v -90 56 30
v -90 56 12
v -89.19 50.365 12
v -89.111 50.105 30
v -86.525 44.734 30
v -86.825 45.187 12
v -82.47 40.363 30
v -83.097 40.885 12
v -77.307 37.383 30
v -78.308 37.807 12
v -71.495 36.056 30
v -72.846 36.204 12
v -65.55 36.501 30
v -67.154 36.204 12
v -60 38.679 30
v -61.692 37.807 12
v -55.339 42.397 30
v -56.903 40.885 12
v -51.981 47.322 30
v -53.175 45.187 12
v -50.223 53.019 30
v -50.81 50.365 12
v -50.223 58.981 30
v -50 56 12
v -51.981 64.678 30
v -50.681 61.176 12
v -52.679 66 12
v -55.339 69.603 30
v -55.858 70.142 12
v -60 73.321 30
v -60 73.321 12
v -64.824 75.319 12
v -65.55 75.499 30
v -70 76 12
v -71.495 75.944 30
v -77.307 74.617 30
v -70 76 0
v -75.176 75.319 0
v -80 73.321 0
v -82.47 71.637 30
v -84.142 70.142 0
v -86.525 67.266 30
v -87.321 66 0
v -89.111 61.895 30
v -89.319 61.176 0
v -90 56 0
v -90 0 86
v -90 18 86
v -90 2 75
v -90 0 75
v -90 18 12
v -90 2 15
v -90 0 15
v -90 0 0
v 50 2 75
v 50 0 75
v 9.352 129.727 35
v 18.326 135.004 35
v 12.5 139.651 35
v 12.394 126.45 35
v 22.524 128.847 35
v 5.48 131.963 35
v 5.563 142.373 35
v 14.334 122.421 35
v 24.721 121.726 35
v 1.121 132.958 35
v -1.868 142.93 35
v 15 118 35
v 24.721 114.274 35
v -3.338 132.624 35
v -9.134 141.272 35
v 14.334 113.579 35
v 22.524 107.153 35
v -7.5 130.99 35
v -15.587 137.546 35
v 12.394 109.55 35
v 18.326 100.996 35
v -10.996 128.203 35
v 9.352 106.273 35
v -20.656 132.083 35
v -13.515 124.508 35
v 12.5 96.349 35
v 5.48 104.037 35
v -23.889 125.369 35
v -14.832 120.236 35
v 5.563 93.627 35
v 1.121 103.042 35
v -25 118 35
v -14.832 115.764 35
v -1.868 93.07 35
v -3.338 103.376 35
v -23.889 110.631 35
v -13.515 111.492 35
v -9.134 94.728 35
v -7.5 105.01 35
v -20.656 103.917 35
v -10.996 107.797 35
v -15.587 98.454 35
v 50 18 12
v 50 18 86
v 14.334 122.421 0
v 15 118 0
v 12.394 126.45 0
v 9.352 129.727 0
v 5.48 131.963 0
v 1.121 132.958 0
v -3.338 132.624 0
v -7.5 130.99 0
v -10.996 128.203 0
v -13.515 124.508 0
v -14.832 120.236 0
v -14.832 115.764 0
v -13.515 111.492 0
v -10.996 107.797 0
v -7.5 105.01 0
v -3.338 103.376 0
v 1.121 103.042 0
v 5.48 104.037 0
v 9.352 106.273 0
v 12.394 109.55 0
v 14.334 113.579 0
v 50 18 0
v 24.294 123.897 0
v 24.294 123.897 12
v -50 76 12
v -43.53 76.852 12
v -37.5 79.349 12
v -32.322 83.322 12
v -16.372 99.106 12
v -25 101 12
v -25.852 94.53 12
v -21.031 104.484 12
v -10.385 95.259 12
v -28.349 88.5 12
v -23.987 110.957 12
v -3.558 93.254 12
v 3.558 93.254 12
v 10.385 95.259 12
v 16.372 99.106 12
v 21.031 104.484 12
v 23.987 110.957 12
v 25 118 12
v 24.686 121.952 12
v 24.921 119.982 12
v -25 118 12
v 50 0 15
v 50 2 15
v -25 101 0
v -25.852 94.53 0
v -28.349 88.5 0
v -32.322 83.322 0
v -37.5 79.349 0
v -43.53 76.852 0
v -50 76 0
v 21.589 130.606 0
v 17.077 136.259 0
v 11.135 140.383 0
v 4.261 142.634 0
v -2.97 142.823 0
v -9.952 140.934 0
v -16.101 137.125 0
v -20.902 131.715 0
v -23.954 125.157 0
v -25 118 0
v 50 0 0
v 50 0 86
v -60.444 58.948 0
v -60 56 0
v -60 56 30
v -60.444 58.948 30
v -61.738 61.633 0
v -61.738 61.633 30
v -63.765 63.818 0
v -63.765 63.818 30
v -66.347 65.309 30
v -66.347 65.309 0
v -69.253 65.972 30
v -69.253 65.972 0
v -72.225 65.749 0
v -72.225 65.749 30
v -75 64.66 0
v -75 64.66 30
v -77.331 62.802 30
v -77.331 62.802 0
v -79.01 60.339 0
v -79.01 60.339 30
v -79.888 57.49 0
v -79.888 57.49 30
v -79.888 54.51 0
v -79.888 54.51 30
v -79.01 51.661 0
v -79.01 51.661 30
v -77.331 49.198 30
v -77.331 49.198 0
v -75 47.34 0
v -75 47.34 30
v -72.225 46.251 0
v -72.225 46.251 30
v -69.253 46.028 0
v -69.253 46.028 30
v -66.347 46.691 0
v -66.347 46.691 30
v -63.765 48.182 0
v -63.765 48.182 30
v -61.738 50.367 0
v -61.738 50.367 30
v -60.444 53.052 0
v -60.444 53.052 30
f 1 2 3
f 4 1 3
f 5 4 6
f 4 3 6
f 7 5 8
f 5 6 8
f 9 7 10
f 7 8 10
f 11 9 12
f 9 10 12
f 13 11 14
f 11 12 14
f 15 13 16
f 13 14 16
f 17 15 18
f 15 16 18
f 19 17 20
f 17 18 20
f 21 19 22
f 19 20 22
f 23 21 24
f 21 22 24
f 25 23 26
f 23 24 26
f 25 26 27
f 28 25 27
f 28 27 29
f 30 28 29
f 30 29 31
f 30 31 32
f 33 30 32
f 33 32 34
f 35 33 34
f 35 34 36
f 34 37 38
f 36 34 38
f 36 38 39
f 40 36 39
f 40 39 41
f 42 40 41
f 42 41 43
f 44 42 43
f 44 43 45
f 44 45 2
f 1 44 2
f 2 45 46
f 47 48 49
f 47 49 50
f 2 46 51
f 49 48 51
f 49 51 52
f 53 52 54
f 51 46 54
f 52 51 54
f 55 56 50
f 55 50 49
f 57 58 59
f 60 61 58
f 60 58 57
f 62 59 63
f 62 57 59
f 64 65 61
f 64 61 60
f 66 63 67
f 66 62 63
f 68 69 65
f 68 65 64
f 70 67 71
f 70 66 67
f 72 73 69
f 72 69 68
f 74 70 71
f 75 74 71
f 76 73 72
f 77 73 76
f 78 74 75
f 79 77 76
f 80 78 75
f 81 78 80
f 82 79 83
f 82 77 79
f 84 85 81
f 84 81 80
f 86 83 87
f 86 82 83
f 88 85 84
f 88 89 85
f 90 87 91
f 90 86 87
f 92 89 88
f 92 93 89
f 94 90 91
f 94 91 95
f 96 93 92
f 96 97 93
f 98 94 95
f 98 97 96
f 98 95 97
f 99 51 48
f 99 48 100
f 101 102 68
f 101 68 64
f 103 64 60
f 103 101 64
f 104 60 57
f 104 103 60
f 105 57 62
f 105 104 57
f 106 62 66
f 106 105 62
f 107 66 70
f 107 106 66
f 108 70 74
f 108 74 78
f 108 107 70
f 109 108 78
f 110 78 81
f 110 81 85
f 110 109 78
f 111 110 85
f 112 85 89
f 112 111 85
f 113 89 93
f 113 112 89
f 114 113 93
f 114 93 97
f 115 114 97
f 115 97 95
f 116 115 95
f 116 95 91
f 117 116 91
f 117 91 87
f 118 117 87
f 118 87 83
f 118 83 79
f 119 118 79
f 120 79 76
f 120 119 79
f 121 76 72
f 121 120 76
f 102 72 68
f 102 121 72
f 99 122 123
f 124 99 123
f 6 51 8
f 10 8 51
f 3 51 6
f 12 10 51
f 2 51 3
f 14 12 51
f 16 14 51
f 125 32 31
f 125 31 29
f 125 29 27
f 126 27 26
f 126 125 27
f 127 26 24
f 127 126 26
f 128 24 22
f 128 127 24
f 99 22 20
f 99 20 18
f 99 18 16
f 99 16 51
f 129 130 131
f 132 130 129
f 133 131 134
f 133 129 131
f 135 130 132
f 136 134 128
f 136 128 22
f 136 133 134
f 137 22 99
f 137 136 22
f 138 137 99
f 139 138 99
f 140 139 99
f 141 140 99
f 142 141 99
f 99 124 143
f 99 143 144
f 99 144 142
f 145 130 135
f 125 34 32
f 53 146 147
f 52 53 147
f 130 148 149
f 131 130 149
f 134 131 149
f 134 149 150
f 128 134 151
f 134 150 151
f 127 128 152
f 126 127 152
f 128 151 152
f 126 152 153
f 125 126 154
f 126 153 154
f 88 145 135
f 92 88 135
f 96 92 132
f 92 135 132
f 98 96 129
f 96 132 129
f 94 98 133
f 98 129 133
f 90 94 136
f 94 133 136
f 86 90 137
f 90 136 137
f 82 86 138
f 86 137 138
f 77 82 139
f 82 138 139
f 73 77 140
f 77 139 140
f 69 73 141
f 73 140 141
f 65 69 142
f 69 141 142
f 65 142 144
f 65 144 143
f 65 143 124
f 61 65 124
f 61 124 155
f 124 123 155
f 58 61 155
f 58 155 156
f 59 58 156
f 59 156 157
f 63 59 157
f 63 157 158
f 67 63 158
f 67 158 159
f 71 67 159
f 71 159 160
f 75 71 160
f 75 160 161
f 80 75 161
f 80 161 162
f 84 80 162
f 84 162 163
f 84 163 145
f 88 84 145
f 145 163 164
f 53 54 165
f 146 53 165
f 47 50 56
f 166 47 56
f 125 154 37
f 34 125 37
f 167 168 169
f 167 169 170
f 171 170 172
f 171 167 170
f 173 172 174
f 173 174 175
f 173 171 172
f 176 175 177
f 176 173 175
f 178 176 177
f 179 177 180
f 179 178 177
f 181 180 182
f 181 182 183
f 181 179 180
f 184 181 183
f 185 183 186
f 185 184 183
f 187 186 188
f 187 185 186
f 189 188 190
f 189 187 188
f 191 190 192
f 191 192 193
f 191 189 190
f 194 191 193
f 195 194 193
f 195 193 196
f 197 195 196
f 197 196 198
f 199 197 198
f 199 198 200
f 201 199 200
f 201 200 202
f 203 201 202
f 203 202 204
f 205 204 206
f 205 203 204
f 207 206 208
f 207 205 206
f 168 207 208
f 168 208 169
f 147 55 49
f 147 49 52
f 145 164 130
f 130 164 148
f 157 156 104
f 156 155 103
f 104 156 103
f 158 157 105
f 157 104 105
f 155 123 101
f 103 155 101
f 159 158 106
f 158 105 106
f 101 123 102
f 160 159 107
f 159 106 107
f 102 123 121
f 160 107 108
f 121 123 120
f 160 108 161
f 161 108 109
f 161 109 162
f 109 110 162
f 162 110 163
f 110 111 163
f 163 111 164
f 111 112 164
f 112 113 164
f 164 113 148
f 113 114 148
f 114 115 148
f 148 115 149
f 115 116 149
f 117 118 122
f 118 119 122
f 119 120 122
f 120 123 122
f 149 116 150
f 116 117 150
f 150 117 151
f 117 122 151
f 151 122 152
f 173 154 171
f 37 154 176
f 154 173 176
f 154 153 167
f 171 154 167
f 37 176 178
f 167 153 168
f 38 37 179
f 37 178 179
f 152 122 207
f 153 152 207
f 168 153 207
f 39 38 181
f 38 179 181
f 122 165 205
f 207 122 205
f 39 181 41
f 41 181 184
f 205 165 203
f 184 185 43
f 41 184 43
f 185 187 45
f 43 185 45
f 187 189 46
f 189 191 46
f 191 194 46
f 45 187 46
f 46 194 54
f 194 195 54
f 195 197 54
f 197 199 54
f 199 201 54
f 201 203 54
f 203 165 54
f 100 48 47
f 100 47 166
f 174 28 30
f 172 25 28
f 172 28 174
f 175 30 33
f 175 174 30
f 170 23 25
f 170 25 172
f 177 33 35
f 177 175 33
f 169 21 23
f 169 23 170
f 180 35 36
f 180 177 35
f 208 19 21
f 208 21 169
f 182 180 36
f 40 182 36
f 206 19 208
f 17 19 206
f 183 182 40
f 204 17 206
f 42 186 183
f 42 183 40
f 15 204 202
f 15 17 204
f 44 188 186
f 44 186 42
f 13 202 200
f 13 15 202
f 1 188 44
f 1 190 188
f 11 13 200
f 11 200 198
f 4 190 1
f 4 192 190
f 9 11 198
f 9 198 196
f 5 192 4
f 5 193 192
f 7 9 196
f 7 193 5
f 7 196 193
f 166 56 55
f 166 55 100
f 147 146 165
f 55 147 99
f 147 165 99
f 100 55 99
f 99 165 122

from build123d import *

# Parameters (mm, degrees)
SKETCH1_W           = 140
SKETCH1_H           = 18
BOSS_EXTRUDE1_DEPTH = 86
BOSS_EXTRUDE2_DEPTH = 12
SKETCH1_4_R         = 15
BOSS_EXTRUDE3_DEPTH = 35
SKETCH1_5_R         = 10
BOSS_EXTRUDE4_DEPTH = 30
CUT_EXTRUDE1_REACH  = 219.819
SKETCH4_W           = 60
SKETCH4_H           = 2


with BuildPart() as part:
    # Sketch1 → Boss-Extrude1 (new body)
    with BuildSketch(Plane.XY):
        with Locations((-20, 9)):
            Rectangle(SKETCH1_W, SKETCH1_H)
    extrude(amount=BOSS_EXTRUDE1_DEPTH)

    # Sketch1<3> → Boss-Extrude2 (add)
    with BuildSketch(Plane.XY):
        with BuildLine():
            Line((-90, 18), (50, 18))
            Line((50, 18), (24.294494718, 123.897247359))
            ThreePointArc((24.294494718, 123.897247359), (24.822997079, 120.969649142), (25, 118))
            ThreePointArc((25, 118), (0, 93), (-25, 118))
            Line((-25, 118), (-25, 101))
            ThreePointArc((-25, 101), (-32.32233047, 83.32233047), (-50, 76))
            Line((-50, 76), (-70, 76))
            ThreePointArc((-70, 76), (-55.857864376, 70.142135624), (-50, 56))
            ThreePointArc((-50, 56), (-70, 36), (-90, 56))
            Line((-90, 56), (-90, 18))
        make_face()
    extrude(amount=BOSS_EXTRUDE2_DEPTH)

    # Sketch1<4> → Boss-Extrude3 (add)
    with BuildSketch(Plane.XY):
        with BuildLine():
            ThreePointArc((25, 118), (24.822997079, 120.969649142), (24.294494718, 123.897247359))
            ThreePointArc((24.294494718, 123.897247359), (-2.969649142, 142.822997079), (-25, 118))
            ThreePointArc((-25, 118), (0, 93), (25, 118))
        make_face()
        with Locations((0, 118)):
            Circle(SKETCH1_4_R, mode=Mode.SUBTRACT)
    extrude(amount=BOSS_EXTRUDE3_DEPTH)

    # Sketch1<5> → Boss-Extrude4 (add)
    with BuildSketch(Plane.XY):
        with BuildLine():
            ThreePointArc((-70, 76), (-84.142135624, 70.142135624), (-90, 56))
            ThreePointArc((-90, 56), (-70, 36), (-50, 56))
            ThreePointArc((-50, 56), (-55.857864376, 70.142135624), (-70, 76))
        make_face()
        with Locations((-70, 56)):
            Circle(SKETCH1_5_R, mode=Mode.SUBTRACT)
    extrude(amount=BOSS_EXTRUDE4_DEPTH)

    # Sketch4 → Cut-Extrude1 (cut, up to next)
    with BuildSketch(Plane(origin=(50, 0, 0), x_dir=(0, 0, -1), z_dir=(1, 0, 0)), mode=Mode.PRIVATE) as cut_extrude1_sk1:
        with Locations((-45, 1)):
            Rectangle(SKETCH4_W, SKETCH4_H)
    cut_extrude1_tool1 = extrude(cut_extrude1_sk1.sketch, amount=-CUT_EXTRUDE1_REACH, mode=Mode.PRIVATE) & part.part
    add(cut_extrude1_tool1.solids().sort_by_distance((50, 1, 45))[0], mode=Mode.SUBTRACT)


solid = part.part
